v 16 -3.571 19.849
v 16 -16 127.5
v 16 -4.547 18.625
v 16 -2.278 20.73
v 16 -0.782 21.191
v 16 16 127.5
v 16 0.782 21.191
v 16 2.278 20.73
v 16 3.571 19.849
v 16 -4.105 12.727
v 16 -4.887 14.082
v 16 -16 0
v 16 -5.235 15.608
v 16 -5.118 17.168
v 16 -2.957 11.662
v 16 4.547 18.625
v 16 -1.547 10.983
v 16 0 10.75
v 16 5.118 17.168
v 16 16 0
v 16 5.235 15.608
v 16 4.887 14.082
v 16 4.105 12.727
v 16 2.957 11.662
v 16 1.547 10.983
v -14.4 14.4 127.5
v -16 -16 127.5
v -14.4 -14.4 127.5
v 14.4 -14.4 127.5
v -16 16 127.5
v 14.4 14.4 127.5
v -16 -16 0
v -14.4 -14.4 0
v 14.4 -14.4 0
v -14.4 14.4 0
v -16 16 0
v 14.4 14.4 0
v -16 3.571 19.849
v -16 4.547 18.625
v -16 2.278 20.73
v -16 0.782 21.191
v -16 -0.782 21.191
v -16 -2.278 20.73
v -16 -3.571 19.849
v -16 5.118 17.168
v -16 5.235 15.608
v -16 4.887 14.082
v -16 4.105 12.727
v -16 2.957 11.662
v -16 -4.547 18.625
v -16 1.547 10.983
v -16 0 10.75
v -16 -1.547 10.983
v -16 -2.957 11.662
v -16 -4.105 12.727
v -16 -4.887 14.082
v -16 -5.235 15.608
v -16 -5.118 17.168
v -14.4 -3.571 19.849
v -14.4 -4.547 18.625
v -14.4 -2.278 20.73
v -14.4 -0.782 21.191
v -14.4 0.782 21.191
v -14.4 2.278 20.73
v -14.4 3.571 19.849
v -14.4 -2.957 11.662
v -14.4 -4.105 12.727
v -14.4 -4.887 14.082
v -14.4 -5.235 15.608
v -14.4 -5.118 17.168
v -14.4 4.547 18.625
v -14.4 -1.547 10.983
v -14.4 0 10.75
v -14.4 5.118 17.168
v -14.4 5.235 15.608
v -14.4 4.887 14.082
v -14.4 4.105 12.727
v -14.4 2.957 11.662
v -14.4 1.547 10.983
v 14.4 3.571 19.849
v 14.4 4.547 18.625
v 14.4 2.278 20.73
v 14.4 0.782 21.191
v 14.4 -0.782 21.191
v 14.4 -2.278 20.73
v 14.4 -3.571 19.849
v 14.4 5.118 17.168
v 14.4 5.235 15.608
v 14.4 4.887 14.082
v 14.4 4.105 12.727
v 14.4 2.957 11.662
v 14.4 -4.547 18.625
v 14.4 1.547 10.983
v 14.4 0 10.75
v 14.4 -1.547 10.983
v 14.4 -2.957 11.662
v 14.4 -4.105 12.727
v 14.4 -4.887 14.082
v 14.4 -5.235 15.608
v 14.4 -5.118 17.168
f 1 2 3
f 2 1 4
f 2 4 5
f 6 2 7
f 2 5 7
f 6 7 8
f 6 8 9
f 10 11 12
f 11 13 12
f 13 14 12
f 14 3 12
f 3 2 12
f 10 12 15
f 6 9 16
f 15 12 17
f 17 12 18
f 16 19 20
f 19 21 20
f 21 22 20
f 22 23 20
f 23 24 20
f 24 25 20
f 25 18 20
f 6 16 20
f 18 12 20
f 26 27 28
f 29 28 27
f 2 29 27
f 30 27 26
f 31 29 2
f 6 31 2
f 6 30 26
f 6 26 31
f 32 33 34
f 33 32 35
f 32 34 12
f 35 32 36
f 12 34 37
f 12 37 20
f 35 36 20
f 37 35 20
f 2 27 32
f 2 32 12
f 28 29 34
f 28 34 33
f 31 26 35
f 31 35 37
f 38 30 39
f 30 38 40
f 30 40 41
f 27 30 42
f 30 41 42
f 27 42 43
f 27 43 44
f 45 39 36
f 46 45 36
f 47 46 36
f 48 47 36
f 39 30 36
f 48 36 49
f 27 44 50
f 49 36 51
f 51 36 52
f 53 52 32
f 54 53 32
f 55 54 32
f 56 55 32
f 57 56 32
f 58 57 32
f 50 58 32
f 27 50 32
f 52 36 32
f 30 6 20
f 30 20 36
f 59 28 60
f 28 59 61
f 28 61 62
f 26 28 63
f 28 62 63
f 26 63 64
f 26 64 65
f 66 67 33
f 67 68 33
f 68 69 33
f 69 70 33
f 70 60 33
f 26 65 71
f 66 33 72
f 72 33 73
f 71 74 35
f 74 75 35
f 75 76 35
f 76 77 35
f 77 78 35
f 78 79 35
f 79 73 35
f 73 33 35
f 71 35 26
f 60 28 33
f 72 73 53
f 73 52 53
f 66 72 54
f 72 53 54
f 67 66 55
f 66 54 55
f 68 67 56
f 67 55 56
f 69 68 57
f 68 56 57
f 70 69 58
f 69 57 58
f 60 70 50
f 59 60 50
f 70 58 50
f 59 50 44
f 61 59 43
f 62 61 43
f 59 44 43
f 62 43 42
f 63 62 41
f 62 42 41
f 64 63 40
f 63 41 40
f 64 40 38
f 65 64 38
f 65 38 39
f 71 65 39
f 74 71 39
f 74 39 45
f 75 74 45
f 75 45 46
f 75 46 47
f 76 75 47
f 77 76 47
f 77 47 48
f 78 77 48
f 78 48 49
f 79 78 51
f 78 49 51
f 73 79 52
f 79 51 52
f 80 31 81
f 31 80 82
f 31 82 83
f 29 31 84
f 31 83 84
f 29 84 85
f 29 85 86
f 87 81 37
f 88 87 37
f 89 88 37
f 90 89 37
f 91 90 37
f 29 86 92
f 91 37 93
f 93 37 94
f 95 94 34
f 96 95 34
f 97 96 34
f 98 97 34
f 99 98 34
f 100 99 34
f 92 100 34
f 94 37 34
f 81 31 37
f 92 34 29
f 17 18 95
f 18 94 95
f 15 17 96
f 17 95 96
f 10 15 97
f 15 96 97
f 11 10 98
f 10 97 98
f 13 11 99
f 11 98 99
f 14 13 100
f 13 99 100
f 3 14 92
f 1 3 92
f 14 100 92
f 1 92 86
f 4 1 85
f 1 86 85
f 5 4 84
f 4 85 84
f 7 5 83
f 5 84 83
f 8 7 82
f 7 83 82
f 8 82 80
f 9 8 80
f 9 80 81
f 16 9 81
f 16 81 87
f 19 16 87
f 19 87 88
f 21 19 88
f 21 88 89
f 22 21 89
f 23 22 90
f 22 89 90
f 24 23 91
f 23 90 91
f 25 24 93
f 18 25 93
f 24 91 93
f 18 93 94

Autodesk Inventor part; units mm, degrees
ref_plane "YZ Plane" through (0, 0, 0) normal (1, 0, 0) x (0, 1, 0)
ref_plane "XZ Plane" through (0, 0, 0) normal (0, 1, 0) x (-1, 0, 0)
ref_plane "XY Plane" through (0, 0, 0) normal (0, 0, 1) x (1, 0, 0)
sketch "スケッチ1" plane through (0, 0, 0) normal (0, 0, 1) x (1, 0, 0)
  line L0 (-16, -16) -> (16, -16)
  line L1 (16, -16) -> (16, 16)
  line L2 (16, 16) -> (-16, 16)
  line L3 (-16, 16) -> (-16, -16)
  line L4 (-16, -16) -> (16, 16) construction
  line L5 (16, -16) -> (-16, 16) construction
  line L6 (-14.4, 14.4) -> (14.4, 14.4)
  line L7 (14.4, 14.4) -> (14.4, -14.4)
  line L8 (14.4, -14.4) -> (-14.4, -14.4)
  line L9 (-14.4, -14.4) -> (-14.4, 14.4)
  point P0 (0, 0)
  dimension "d0" = 32
  dimension "d1" = 32
  dimension "d2" = 1.6
extrude "押し出し1" add sketch "スケッチ1" along normal blind 127.5
sketch "スケッチ2" plane through (16, -16, 127.5) normal (1, 0, 0) x (0, 0, -1)
  line L0 (0, 0) -> (0, 32) projected
  point P0 (127.5, 16)
  point P1 (111.5, 16)
  dimension "d8" = 111.5
hole "穴1" at (16, 0, 16) direction (-1, 0, 0) diameter 10.5 end through all
properties part number "PipeB"
